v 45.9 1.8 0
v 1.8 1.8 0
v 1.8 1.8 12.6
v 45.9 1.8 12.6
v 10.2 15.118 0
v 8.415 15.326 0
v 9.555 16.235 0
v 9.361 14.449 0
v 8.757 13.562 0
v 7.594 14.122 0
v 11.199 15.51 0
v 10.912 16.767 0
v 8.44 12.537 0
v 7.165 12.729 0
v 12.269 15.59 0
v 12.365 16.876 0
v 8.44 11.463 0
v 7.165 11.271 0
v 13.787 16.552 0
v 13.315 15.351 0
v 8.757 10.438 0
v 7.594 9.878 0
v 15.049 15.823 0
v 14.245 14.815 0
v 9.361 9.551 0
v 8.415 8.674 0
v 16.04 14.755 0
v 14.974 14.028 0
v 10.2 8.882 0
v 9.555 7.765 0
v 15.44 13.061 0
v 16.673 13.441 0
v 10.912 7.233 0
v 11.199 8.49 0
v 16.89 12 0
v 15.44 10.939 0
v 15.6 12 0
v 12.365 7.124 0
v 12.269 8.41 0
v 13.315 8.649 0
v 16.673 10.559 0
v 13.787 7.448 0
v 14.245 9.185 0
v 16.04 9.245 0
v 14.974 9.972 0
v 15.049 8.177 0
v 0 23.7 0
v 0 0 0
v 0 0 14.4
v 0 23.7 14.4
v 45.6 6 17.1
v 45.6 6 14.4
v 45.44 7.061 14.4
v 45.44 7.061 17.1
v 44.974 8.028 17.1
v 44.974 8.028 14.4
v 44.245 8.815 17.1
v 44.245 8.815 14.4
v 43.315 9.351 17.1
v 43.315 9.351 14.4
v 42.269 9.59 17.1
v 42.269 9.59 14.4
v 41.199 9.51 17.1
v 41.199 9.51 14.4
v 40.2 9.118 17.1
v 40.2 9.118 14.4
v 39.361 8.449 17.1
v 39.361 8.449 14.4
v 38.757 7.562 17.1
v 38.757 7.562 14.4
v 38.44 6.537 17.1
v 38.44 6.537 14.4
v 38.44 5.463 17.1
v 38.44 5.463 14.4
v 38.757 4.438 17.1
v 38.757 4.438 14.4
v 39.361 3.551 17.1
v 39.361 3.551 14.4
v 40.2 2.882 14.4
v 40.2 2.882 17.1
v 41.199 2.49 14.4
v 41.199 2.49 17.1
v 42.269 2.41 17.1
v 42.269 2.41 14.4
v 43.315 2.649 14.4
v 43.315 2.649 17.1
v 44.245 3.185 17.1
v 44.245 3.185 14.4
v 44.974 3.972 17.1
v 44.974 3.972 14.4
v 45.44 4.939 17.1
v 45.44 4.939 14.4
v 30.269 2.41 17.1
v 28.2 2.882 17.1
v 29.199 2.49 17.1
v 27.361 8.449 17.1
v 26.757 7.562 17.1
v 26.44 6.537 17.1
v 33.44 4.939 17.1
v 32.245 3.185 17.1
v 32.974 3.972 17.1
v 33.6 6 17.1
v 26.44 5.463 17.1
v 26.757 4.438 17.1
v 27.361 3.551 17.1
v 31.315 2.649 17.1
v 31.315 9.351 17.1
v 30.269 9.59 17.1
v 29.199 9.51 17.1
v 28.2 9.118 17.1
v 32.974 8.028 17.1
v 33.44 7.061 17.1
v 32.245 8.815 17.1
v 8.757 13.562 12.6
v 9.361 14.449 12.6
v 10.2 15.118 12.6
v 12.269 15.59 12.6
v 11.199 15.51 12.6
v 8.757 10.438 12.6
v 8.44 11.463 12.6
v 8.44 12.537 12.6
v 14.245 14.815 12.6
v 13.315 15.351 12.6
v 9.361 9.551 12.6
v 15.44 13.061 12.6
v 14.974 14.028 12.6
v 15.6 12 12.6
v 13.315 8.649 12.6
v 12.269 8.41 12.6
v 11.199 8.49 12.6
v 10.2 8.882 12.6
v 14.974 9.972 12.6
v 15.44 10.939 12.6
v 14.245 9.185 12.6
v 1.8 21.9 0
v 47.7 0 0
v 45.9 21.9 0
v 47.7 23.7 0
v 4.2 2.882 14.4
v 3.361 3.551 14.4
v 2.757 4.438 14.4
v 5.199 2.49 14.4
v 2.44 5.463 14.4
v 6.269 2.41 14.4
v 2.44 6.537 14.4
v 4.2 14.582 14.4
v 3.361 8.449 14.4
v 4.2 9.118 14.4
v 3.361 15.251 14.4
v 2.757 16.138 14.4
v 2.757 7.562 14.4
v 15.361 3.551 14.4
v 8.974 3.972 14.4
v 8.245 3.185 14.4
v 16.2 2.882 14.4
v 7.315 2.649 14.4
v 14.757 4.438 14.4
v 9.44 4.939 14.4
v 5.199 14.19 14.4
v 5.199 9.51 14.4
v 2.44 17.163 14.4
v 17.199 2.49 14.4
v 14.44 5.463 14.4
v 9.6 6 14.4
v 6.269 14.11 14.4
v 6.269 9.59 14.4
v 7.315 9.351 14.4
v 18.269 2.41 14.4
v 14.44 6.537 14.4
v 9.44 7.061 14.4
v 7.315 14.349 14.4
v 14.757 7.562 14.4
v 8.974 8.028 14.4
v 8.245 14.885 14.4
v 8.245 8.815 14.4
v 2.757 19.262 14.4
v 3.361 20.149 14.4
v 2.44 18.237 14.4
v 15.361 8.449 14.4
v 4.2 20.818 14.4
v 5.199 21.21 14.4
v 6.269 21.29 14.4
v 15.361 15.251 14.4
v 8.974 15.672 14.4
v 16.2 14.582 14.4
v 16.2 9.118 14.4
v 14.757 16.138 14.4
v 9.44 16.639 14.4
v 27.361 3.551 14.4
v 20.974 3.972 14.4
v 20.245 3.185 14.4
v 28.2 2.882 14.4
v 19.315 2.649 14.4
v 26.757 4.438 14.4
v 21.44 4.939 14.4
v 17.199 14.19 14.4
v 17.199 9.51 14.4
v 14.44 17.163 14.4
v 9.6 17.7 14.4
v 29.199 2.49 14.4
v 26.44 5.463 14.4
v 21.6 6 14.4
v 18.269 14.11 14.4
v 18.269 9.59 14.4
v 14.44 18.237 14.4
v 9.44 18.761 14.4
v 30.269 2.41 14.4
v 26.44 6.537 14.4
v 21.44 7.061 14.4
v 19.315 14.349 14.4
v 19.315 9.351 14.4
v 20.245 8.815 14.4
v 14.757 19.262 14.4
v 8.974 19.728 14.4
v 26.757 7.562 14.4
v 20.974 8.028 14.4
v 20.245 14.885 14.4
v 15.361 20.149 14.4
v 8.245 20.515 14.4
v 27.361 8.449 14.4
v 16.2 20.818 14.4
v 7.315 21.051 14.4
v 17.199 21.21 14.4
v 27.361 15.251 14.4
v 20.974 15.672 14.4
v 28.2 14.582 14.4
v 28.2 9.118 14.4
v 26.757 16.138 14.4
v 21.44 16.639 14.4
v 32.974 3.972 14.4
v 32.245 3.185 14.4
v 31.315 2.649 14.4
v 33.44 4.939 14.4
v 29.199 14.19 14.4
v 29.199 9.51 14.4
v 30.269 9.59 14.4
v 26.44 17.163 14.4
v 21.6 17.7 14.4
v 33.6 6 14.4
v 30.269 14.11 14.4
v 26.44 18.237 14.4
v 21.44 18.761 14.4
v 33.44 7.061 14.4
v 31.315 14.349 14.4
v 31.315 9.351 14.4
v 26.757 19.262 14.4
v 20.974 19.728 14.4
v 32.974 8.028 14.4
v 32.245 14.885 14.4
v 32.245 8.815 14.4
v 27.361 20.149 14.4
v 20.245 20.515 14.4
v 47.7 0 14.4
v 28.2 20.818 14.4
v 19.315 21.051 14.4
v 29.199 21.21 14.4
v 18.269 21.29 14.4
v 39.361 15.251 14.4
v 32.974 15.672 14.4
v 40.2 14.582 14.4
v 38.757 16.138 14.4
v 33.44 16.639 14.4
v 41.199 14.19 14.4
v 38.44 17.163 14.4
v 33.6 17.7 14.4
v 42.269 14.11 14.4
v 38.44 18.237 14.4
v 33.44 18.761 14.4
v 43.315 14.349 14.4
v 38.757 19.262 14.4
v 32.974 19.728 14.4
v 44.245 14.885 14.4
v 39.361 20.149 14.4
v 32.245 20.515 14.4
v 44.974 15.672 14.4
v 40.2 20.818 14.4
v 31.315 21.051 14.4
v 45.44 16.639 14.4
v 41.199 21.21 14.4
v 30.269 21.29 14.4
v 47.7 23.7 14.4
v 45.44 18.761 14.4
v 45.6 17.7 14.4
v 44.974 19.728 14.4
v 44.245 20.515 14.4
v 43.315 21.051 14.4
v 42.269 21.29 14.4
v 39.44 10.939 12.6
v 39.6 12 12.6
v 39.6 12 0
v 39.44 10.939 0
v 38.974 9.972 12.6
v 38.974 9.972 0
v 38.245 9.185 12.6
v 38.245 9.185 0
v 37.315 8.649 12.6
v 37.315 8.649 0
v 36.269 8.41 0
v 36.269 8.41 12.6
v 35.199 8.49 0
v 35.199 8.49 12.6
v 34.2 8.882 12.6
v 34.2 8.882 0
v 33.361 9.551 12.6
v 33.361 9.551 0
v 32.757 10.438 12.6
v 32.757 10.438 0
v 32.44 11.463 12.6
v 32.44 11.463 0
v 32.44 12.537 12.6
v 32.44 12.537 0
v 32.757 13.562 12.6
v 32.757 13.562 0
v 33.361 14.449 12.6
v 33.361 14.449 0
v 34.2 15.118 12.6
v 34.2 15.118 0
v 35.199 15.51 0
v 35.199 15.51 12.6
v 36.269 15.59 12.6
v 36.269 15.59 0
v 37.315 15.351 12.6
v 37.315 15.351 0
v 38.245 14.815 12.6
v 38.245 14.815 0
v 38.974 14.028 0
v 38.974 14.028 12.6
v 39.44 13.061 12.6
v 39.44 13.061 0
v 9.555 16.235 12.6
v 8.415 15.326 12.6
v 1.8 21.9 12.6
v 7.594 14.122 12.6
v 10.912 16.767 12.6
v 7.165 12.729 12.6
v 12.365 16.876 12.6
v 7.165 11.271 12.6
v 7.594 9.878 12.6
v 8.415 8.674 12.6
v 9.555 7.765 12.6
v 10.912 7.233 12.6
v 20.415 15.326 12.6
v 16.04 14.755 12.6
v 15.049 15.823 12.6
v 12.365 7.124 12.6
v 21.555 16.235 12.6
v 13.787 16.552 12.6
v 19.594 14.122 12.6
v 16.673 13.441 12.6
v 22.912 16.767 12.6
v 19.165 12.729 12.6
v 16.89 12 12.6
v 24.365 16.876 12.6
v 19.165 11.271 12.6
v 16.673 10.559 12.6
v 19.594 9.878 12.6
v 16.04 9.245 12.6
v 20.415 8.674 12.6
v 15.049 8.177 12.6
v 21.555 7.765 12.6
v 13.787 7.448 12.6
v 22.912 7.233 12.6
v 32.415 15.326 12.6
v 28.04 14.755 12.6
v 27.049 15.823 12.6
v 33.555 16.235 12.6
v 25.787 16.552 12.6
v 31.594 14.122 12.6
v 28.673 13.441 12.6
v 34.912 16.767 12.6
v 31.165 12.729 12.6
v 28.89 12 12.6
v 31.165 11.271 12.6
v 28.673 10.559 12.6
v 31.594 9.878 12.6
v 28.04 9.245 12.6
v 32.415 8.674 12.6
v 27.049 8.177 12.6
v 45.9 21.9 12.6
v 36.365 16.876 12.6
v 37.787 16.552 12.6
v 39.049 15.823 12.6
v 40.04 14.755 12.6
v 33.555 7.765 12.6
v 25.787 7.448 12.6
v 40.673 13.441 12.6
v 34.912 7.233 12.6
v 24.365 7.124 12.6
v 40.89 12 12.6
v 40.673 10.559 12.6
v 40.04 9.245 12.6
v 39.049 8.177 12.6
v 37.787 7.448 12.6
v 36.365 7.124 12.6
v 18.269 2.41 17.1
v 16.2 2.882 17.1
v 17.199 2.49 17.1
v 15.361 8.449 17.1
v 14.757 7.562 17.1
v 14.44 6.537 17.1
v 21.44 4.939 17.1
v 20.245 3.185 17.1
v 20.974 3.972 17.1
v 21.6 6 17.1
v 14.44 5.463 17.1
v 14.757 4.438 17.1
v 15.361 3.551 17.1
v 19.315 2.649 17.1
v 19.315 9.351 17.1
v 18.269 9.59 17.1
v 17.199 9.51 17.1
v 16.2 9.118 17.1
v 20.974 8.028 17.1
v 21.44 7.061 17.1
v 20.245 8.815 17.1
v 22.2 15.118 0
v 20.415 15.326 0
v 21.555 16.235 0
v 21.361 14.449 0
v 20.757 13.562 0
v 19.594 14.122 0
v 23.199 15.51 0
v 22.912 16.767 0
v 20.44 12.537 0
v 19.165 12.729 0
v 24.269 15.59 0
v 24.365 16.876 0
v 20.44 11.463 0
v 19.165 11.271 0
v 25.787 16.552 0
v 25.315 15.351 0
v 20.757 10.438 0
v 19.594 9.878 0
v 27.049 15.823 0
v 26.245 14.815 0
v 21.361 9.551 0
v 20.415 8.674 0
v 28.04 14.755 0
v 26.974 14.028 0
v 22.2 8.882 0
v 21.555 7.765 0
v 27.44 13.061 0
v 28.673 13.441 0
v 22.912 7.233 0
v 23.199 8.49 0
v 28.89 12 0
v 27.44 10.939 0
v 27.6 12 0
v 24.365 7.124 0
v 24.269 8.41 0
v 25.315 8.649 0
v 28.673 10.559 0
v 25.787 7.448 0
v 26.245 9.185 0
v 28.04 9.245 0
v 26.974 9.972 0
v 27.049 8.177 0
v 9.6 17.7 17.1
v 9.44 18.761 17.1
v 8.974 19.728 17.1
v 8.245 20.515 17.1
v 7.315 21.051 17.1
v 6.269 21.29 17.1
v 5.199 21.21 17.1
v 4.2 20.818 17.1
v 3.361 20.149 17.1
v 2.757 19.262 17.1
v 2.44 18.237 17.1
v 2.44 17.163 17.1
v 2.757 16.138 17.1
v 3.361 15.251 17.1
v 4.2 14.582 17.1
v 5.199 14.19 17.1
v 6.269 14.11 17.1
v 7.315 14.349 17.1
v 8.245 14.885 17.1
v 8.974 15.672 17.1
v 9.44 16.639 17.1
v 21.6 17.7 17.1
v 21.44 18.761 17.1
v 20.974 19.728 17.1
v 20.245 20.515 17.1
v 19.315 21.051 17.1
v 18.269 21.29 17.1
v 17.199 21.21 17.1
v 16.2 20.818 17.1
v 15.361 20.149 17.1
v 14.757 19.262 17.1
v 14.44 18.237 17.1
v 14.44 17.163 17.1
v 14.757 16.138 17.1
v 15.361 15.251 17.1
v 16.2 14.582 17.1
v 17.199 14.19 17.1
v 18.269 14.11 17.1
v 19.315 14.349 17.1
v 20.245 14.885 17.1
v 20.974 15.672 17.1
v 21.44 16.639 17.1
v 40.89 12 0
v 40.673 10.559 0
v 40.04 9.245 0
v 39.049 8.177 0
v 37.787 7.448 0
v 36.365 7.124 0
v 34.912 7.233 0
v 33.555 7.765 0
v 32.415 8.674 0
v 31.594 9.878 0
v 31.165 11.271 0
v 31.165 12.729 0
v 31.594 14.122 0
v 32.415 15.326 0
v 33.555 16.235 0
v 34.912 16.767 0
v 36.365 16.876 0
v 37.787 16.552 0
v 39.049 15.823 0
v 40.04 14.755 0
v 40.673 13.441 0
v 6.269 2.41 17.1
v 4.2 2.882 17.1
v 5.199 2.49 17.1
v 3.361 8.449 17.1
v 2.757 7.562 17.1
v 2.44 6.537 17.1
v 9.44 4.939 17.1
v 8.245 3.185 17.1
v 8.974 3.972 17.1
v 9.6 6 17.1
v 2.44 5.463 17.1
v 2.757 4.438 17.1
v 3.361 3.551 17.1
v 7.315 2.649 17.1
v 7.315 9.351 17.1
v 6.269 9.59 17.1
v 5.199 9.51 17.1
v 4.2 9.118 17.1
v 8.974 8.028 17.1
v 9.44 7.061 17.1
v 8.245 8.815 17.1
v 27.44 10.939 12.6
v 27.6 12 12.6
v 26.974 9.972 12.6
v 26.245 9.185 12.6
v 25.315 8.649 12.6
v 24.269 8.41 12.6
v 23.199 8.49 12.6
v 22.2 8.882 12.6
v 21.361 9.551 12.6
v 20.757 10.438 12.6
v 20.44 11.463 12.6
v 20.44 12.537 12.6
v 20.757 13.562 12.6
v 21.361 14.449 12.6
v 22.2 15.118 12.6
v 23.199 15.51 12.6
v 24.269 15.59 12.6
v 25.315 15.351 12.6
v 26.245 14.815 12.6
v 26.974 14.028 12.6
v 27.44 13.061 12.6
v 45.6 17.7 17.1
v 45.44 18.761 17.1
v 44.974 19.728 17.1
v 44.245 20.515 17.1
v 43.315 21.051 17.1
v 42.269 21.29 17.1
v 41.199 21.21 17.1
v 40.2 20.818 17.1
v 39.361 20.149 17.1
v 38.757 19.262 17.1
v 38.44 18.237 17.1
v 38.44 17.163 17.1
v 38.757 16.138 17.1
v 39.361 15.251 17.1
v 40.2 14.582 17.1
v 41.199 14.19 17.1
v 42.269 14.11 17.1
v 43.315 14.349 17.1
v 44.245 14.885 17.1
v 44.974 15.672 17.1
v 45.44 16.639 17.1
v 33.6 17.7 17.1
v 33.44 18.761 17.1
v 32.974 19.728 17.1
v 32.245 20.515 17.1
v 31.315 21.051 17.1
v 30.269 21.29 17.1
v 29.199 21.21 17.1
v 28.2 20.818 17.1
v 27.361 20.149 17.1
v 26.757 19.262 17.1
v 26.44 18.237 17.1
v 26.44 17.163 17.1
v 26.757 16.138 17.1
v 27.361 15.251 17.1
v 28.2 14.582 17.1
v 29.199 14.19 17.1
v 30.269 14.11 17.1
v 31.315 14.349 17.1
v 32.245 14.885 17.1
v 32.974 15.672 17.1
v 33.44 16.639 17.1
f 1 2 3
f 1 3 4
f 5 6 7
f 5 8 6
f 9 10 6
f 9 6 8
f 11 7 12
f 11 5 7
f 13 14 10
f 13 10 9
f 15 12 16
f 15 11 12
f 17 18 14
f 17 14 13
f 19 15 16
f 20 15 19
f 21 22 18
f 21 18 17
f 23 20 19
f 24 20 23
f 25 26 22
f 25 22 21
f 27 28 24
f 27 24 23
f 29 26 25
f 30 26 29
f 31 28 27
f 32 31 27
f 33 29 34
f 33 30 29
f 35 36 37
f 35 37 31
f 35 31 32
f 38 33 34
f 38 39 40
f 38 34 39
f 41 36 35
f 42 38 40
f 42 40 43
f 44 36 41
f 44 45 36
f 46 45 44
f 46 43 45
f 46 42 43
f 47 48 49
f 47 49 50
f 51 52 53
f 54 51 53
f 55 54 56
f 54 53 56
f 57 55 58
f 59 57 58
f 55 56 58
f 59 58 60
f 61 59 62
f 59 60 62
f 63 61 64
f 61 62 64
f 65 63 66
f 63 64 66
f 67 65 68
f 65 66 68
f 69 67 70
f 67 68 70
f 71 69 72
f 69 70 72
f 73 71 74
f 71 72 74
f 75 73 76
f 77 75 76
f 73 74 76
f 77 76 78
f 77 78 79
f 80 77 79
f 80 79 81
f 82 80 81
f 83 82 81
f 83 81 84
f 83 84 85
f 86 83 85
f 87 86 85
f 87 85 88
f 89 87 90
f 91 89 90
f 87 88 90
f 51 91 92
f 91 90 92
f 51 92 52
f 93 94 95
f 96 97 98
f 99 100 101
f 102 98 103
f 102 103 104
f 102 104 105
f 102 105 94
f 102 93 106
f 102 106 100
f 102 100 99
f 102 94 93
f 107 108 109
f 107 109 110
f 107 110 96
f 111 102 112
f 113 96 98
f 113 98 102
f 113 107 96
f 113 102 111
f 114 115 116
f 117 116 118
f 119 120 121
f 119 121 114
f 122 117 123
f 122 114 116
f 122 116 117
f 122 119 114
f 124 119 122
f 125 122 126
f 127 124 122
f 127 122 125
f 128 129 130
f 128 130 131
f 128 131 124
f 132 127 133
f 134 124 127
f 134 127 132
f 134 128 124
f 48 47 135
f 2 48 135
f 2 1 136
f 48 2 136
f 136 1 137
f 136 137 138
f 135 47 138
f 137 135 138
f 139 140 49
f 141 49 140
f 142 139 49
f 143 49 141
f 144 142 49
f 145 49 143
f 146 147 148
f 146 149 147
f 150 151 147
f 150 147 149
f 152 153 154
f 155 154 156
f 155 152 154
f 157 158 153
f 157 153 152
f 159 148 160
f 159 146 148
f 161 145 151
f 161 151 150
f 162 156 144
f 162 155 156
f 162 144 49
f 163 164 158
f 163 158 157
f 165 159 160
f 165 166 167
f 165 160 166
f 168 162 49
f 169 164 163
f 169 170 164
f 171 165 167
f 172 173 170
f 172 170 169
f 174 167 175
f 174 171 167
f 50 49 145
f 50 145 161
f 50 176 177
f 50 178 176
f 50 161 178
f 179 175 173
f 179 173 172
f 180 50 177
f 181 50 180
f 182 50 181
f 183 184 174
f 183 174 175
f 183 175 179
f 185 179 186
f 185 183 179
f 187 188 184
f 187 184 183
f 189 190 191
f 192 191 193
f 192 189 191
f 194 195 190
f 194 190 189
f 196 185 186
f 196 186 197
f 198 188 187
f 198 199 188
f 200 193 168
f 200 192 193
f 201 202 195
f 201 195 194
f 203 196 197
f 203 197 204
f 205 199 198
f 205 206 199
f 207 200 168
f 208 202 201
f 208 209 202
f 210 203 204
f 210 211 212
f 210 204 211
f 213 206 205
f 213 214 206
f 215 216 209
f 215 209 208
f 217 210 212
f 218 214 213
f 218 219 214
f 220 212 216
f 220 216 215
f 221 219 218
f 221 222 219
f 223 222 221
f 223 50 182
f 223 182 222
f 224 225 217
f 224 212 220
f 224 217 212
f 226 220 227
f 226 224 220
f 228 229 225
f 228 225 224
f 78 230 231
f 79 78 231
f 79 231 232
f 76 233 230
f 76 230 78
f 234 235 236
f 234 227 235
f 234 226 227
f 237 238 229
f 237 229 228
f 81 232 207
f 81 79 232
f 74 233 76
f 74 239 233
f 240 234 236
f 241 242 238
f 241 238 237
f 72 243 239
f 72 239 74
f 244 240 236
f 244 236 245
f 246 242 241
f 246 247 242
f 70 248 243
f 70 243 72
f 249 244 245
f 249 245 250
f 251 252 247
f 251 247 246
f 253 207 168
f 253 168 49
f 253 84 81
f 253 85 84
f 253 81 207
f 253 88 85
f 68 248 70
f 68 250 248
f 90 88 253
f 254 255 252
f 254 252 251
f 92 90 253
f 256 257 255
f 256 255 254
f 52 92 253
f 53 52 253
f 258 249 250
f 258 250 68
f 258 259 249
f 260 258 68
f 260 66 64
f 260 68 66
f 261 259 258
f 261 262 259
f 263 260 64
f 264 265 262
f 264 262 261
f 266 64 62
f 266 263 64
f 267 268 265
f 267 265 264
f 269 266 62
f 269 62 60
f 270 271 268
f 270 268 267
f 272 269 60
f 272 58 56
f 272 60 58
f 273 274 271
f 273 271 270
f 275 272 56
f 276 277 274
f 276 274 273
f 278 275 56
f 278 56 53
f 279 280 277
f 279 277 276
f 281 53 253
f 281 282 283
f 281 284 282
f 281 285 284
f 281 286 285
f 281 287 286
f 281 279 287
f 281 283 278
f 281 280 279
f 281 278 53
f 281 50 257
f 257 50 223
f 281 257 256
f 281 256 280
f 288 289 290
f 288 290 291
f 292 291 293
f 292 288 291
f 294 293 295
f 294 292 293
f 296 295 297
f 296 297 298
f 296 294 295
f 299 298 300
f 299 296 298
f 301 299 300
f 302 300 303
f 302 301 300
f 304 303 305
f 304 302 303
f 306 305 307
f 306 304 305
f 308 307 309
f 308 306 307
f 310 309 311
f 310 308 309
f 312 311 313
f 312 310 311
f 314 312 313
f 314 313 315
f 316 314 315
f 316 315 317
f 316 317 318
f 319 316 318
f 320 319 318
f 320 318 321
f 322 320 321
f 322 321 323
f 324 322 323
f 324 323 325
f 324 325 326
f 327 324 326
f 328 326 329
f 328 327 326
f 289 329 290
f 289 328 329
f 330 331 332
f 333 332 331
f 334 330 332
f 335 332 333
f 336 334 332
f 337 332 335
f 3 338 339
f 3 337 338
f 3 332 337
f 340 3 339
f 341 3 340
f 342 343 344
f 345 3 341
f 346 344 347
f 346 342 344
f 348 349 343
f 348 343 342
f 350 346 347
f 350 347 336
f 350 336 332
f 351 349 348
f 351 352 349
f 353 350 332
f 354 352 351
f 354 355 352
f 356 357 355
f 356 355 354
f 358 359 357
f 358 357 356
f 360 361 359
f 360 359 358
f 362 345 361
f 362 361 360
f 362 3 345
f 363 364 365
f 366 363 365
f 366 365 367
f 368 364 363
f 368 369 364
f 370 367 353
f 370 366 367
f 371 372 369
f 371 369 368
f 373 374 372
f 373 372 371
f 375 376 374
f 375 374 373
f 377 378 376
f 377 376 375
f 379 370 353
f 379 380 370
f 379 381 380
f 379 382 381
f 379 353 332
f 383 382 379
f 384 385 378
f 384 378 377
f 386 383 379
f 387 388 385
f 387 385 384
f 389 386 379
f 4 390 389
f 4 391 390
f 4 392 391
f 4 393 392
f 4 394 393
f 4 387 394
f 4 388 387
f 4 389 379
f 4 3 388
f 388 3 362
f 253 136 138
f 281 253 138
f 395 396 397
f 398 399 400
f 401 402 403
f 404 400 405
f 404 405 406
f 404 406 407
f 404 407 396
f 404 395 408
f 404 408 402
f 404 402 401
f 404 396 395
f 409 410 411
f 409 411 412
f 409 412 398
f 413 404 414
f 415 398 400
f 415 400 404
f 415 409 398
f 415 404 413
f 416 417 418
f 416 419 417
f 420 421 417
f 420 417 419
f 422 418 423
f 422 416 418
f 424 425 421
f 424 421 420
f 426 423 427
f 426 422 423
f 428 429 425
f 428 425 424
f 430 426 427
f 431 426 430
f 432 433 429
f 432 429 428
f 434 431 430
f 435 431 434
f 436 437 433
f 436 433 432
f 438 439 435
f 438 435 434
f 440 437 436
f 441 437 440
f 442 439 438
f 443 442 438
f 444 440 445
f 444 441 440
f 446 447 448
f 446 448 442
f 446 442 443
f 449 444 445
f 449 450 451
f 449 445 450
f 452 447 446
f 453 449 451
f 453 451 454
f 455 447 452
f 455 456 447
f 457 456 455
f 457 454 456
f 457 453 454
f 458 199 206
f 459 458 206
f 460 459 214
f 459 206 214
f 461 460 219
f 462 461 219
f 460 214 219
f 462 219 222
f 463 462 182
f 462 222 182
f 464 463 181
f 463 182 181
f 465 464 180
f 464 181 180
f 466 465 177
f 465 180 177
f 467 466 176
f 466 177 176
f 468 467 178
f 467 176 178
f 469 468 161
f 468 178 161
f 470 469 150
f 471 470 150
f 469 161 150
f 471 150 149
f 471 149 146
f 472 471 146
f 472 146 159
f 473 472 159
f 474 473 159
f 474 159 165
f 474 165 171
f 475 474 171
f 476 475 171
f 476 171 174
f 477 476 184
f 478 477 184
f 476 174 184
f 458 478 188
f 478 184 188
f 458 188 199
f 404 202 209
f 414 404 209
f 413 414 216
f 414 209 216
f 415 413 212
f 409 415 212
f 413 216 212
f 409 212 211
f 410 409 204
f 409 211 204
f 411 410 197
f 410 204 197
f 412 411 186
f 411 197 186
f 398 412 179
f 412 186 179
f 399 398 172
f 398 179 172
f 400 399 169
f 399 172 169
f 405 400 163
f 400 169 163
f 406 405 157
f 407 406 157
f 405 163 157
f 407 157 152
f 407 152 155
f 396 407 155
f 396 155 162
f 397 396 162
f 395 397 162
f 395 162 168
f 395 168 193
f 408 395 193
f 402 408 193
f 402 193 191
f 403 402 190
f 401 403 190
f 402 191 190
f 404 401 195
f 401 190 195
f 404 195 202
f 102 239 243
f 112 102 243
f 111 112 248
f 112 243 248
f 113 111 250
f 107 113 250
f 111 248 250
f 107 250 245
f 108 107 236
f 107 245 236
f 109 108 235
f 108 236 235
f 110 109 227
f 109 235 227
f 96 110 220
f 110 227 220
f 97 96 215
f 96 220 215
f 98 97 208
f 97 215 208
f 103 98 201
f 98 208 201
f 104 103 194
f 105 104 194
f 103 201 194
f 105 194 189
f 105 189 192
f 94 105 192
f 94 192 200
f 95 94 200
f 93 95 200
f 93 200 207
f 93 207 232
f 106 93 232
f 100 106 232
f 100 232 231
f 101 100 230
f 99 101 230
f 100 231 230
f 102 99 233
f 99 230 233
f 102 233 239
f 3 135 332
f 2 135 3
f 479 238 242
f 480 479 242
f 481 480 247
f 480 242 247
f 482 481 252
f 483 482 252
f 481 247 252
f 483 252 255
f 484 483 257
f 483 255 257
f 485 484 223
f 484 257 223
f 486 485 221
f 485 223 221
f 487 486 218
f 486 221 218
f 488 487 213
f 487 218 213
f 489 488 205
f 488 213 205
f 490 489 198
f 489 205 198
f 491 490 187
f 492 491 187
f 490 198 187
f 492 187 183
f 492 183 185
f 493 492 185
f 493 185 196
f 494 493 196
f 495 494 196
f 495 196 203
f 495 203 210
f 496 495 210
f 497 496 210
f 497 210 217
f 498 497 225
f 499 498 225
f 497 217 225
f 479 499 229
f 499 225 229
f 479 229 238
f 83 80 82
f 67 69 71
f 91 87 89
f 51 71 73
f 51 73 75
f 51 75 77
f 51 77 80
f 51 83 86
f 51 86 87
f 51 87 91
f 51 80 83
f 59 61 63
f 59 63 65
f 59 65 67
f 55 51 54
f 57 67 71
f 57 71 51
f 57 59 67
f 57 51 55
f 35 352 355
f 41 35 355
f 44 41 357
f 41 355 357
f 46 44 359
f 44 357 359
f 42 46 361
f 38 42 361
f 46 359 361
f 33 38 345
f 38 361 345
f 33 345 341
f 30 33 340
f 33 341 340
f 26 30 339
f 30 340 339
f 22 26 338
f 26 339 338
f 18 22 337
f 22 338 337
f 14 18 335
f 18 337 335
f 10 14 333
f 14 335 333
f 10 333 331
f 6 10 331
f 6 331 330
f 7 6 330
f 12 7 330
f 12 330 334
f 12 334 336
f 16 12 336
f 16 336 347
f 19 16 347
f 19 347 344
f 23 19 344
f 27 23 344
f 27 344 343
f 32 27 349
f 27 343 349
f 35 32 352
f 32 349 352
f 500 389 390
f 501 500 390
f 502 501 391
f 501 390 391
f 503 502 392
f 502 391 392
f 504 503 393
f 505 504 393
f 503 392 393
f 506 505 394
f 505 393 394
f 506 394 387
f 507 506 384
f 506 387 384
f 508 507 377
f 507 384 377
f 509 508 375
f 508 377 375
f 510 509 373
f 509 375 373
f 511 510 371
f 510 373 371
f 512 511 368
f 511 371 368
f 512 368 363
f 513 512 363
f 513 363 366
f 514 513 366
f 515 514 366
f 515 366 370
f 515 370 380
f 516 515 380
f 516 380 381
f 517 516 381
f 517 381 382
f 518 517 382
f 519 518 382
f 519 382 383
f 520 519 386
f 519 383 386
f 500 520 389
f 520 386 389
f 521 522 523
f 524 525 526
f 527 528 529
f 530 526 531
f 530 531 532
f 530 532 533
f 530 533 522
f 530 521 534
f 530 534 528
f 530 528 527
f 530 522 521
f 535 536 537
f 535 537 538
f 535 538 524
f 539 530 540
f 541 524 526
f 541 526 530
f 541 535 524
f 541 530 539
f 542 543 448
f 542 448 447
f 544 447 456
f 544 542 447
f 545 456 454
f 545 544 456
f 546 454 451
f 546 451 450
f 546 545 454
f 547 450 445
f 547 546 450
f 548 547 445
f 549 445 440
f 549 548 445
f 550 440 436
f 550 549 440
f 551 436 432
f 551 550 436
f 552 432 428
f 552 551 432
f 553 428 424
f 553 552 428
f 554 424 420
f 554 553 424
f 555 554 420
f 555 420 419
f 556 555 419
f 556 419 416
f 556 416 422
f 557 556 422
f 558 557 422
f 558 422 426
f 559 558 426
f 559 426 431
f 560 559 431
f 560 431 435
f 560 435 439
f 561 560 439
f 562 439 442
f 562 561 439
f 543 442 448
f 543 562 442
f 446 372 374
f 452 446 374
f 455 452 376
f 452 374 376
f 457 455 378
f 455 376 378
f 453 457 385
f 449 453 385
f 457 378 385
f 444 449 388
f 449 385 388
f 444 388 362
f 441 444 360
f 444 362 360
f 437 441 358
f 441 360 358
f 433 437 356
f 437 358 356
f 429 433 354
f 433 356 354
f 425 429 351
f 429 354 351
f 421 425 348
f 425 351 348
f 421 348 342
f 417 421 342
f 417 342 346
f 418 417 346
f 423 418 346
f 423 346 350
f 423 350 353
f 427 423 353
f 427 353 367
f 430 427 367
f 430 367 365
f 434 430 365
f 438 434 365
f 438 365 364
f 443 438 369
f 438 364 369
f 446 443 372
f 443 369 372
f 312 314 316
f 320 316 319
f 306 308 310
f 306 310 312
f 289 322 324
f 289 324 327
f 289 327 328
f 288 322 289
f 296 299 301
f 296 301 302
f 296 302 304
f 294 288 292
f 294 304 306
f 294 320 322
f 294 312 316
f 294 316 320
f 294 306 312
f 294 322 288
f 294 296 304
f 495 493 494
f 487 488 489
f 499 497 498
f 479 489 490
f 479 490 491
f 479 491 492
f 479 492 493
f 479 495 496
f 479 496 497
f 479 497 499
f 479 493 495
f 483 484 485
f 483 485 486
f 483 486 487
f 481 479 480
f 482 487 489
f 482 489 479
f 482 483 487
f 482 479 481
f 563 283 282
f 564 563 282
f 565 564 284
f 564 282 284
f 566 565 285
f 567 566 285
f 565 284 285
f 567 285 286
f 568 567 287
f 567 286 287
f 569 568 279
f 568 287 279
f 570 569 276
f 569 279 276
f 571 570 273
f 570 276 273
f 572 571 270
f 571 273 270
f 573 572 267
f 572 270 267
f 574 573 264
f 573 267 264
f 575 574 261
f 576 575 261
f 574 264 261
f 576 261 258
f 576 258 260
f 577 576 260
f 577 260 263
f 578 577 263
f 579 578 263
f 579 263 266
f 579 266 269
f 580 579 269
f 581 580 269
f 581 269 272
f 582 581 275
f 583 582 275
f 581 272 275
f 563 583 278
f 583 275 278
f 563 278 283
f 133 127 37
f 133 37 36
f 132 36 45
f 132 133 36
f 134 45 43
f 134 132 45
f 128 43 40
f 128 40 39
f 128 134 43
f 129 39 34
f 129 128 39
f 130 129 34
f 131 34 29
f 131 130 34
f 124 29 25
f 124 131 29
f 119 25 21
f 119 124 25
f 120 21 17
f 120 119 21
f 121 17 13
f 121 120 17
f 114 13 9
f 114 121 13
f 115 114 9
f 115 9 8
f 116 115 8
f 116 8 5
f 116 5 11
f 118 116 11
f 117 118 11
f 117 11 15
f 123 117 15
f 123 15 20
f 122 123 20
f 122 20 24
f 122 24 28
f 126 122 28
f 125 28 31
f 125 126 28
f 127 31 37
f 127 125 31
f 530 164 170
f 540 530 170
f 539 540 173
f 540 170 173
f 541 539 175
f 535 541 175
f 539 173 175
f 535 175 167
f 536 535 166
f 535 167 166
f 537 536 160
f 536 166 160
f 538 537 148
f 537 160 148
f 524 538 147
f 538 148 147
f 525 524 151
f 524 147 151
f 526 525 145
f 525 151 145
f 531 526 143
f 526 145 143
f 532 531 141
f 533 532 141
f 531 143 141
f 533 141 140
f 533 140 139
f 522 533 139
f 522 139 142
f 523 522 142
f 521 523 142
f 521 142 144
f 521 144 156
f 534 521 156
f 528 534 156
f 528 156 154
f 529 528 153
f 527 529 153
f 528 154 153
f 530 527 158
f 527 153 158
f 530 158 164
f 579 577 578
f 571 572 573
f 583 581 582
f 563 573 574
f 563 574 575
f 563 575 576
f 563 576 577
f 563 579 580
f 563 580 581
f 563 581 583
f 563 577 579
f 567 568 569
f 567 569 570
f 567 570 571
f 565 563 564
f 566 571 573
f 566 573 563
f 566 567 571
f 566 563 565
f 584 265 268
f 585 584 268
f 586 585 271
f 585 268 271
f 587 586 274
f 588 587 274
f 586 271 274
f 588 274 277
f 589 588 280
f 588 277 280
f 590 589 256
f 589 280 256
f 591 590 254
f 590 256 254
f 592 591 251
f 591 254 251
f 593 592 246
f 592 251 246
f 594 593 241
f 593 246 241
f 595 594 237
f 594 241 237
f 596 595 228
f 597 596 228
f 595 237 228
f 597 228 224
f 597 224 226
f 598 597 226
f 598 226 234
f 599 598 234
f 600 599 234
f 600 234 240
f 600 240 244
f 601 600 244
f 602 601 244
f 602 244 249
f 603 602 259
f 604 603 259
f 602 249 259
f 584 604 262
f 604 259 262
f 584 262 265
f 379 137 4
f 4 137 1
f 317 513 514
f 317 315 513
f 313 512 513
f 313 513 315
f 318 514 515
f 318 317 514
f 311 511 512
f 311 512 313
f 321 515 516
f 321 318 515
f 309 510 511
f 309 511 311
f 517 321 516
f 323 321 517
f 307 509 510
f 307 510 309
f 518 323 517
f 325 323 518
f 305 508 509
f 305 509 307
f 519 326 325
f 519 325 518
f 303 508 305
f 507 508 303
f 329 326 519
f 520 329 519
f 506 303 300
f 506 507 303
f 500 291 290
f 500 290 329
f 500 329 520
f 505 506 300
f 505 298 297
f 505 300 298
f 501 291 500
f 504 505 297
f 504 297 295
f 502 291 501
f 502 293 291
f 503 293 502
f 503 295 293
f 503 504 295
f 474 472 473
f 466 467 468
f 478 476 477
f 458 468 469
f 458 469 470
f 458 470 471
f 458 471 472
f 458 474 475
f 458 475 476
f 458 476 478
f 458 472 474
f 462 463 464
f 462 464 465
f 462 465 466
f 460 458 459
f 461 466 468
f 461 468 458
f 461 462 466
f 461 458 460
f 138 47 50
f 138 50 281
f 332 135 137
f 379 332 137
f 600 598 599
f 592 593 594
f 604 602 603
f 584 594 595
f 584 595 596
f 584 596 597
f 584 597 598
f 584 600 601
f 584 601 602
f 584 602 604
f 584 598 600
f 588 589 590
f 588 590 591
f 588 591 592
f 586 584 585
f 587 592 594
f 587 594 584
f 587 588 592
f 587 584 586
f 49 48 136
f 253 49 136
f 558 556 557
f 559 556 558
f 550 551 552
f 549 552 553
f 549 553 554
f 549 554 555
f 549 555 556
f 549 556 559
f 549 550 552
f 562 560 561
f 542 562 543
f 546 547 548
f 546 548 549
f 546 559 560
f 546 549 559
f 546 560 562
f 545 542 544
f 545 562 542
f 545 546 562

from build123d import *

# Parameters (mm, degrees)
SKETCH_W               = 47.7
SKETCH_H               = 23.7
PAD_DEPTH              = 14.4
SKETCH001_W            = 44.1
SKETCH001_H            = 20.1
POCKET_DEPTH           = 12.6
SKETCH002_R            = 3.6
PAD001_DEPTH           = 2.7
LINEARPATTERN_COUNT    = 4
LINEARPATTERN_PITCH    = 12
SKETCH003_R            = 4.89
SKETCH003_R_2          = 3.6
PAD002_DEPTH           = 12.6
LINEARPATTERN001_COUNT = 3
LINEARPATTERN001_PITCH = 12


with BuildPart() as part:
    # Sketch → Pad (new body)
    with BuildSketch(Plane.XY):
        with Locations((23.85, 11.85)):
            Rectangle(SKETCH_W, SKETCH_H)
    extrude(amount=PAD_DEPTH)

    # Sketch001 (on Face5 of Pad) → Pocket (cut)
    with BuildSketch(Plane(origin=(0, 0, 0), x_dir=(1, 0, 0), z_dir=(0, 0, -1))):
        with Locations((23.85, -11.85)):
            Rectangle(SKETCH001_W, SKETCH001_H)
    extrude(amount=-POCKET_DEPTH, mode=Mode.SUBTRACT)

    # Sketch002 (on Face5 of Pocket) → Pad001 (join)
    with BuildSketch(Plane.XY.offset(14.4)):
        with Locations((6, 17.7)):
            Circle(SKETCH002_R)
        with Locations((6, 6)):
            Circle(SKETCH002_R)
    pad001 = extrude(amount=PAD001_DEPTH)

    # LinearPattern: Pad001 ×4
    with Locations(*[(i * LINEARPATTERN_PITCH, 0, 0) for i in range(1, LINEARPATTERN_COUNT)]):
        add(pad001)

    # Sketch003 (on Face19 of LinearPattern) → Pad002 (join)
    with BuildSketch(Plane(origin=(0, 0, 12.6), x_dir=(1, 0, 0), z_dir=(0, 0, -1))):
        with Locations((12, -12)):
            Circle(SKETCH003_R)
        with Locations((12, -12)):
            Circle(SKETCH003_R_2, mode=Mode.SUBTRACT)
    pad002 = extrude(amount=PAD002_DEPTH)

    # LinearPattern001: Pad002 ×3
    with Locations(*[(i * LINEARPATTERN001_PITCH, 0, 0) for i in range(1, LINEARPATTERN001_COUNT)]):
        add(pad002)


solid = part.part
